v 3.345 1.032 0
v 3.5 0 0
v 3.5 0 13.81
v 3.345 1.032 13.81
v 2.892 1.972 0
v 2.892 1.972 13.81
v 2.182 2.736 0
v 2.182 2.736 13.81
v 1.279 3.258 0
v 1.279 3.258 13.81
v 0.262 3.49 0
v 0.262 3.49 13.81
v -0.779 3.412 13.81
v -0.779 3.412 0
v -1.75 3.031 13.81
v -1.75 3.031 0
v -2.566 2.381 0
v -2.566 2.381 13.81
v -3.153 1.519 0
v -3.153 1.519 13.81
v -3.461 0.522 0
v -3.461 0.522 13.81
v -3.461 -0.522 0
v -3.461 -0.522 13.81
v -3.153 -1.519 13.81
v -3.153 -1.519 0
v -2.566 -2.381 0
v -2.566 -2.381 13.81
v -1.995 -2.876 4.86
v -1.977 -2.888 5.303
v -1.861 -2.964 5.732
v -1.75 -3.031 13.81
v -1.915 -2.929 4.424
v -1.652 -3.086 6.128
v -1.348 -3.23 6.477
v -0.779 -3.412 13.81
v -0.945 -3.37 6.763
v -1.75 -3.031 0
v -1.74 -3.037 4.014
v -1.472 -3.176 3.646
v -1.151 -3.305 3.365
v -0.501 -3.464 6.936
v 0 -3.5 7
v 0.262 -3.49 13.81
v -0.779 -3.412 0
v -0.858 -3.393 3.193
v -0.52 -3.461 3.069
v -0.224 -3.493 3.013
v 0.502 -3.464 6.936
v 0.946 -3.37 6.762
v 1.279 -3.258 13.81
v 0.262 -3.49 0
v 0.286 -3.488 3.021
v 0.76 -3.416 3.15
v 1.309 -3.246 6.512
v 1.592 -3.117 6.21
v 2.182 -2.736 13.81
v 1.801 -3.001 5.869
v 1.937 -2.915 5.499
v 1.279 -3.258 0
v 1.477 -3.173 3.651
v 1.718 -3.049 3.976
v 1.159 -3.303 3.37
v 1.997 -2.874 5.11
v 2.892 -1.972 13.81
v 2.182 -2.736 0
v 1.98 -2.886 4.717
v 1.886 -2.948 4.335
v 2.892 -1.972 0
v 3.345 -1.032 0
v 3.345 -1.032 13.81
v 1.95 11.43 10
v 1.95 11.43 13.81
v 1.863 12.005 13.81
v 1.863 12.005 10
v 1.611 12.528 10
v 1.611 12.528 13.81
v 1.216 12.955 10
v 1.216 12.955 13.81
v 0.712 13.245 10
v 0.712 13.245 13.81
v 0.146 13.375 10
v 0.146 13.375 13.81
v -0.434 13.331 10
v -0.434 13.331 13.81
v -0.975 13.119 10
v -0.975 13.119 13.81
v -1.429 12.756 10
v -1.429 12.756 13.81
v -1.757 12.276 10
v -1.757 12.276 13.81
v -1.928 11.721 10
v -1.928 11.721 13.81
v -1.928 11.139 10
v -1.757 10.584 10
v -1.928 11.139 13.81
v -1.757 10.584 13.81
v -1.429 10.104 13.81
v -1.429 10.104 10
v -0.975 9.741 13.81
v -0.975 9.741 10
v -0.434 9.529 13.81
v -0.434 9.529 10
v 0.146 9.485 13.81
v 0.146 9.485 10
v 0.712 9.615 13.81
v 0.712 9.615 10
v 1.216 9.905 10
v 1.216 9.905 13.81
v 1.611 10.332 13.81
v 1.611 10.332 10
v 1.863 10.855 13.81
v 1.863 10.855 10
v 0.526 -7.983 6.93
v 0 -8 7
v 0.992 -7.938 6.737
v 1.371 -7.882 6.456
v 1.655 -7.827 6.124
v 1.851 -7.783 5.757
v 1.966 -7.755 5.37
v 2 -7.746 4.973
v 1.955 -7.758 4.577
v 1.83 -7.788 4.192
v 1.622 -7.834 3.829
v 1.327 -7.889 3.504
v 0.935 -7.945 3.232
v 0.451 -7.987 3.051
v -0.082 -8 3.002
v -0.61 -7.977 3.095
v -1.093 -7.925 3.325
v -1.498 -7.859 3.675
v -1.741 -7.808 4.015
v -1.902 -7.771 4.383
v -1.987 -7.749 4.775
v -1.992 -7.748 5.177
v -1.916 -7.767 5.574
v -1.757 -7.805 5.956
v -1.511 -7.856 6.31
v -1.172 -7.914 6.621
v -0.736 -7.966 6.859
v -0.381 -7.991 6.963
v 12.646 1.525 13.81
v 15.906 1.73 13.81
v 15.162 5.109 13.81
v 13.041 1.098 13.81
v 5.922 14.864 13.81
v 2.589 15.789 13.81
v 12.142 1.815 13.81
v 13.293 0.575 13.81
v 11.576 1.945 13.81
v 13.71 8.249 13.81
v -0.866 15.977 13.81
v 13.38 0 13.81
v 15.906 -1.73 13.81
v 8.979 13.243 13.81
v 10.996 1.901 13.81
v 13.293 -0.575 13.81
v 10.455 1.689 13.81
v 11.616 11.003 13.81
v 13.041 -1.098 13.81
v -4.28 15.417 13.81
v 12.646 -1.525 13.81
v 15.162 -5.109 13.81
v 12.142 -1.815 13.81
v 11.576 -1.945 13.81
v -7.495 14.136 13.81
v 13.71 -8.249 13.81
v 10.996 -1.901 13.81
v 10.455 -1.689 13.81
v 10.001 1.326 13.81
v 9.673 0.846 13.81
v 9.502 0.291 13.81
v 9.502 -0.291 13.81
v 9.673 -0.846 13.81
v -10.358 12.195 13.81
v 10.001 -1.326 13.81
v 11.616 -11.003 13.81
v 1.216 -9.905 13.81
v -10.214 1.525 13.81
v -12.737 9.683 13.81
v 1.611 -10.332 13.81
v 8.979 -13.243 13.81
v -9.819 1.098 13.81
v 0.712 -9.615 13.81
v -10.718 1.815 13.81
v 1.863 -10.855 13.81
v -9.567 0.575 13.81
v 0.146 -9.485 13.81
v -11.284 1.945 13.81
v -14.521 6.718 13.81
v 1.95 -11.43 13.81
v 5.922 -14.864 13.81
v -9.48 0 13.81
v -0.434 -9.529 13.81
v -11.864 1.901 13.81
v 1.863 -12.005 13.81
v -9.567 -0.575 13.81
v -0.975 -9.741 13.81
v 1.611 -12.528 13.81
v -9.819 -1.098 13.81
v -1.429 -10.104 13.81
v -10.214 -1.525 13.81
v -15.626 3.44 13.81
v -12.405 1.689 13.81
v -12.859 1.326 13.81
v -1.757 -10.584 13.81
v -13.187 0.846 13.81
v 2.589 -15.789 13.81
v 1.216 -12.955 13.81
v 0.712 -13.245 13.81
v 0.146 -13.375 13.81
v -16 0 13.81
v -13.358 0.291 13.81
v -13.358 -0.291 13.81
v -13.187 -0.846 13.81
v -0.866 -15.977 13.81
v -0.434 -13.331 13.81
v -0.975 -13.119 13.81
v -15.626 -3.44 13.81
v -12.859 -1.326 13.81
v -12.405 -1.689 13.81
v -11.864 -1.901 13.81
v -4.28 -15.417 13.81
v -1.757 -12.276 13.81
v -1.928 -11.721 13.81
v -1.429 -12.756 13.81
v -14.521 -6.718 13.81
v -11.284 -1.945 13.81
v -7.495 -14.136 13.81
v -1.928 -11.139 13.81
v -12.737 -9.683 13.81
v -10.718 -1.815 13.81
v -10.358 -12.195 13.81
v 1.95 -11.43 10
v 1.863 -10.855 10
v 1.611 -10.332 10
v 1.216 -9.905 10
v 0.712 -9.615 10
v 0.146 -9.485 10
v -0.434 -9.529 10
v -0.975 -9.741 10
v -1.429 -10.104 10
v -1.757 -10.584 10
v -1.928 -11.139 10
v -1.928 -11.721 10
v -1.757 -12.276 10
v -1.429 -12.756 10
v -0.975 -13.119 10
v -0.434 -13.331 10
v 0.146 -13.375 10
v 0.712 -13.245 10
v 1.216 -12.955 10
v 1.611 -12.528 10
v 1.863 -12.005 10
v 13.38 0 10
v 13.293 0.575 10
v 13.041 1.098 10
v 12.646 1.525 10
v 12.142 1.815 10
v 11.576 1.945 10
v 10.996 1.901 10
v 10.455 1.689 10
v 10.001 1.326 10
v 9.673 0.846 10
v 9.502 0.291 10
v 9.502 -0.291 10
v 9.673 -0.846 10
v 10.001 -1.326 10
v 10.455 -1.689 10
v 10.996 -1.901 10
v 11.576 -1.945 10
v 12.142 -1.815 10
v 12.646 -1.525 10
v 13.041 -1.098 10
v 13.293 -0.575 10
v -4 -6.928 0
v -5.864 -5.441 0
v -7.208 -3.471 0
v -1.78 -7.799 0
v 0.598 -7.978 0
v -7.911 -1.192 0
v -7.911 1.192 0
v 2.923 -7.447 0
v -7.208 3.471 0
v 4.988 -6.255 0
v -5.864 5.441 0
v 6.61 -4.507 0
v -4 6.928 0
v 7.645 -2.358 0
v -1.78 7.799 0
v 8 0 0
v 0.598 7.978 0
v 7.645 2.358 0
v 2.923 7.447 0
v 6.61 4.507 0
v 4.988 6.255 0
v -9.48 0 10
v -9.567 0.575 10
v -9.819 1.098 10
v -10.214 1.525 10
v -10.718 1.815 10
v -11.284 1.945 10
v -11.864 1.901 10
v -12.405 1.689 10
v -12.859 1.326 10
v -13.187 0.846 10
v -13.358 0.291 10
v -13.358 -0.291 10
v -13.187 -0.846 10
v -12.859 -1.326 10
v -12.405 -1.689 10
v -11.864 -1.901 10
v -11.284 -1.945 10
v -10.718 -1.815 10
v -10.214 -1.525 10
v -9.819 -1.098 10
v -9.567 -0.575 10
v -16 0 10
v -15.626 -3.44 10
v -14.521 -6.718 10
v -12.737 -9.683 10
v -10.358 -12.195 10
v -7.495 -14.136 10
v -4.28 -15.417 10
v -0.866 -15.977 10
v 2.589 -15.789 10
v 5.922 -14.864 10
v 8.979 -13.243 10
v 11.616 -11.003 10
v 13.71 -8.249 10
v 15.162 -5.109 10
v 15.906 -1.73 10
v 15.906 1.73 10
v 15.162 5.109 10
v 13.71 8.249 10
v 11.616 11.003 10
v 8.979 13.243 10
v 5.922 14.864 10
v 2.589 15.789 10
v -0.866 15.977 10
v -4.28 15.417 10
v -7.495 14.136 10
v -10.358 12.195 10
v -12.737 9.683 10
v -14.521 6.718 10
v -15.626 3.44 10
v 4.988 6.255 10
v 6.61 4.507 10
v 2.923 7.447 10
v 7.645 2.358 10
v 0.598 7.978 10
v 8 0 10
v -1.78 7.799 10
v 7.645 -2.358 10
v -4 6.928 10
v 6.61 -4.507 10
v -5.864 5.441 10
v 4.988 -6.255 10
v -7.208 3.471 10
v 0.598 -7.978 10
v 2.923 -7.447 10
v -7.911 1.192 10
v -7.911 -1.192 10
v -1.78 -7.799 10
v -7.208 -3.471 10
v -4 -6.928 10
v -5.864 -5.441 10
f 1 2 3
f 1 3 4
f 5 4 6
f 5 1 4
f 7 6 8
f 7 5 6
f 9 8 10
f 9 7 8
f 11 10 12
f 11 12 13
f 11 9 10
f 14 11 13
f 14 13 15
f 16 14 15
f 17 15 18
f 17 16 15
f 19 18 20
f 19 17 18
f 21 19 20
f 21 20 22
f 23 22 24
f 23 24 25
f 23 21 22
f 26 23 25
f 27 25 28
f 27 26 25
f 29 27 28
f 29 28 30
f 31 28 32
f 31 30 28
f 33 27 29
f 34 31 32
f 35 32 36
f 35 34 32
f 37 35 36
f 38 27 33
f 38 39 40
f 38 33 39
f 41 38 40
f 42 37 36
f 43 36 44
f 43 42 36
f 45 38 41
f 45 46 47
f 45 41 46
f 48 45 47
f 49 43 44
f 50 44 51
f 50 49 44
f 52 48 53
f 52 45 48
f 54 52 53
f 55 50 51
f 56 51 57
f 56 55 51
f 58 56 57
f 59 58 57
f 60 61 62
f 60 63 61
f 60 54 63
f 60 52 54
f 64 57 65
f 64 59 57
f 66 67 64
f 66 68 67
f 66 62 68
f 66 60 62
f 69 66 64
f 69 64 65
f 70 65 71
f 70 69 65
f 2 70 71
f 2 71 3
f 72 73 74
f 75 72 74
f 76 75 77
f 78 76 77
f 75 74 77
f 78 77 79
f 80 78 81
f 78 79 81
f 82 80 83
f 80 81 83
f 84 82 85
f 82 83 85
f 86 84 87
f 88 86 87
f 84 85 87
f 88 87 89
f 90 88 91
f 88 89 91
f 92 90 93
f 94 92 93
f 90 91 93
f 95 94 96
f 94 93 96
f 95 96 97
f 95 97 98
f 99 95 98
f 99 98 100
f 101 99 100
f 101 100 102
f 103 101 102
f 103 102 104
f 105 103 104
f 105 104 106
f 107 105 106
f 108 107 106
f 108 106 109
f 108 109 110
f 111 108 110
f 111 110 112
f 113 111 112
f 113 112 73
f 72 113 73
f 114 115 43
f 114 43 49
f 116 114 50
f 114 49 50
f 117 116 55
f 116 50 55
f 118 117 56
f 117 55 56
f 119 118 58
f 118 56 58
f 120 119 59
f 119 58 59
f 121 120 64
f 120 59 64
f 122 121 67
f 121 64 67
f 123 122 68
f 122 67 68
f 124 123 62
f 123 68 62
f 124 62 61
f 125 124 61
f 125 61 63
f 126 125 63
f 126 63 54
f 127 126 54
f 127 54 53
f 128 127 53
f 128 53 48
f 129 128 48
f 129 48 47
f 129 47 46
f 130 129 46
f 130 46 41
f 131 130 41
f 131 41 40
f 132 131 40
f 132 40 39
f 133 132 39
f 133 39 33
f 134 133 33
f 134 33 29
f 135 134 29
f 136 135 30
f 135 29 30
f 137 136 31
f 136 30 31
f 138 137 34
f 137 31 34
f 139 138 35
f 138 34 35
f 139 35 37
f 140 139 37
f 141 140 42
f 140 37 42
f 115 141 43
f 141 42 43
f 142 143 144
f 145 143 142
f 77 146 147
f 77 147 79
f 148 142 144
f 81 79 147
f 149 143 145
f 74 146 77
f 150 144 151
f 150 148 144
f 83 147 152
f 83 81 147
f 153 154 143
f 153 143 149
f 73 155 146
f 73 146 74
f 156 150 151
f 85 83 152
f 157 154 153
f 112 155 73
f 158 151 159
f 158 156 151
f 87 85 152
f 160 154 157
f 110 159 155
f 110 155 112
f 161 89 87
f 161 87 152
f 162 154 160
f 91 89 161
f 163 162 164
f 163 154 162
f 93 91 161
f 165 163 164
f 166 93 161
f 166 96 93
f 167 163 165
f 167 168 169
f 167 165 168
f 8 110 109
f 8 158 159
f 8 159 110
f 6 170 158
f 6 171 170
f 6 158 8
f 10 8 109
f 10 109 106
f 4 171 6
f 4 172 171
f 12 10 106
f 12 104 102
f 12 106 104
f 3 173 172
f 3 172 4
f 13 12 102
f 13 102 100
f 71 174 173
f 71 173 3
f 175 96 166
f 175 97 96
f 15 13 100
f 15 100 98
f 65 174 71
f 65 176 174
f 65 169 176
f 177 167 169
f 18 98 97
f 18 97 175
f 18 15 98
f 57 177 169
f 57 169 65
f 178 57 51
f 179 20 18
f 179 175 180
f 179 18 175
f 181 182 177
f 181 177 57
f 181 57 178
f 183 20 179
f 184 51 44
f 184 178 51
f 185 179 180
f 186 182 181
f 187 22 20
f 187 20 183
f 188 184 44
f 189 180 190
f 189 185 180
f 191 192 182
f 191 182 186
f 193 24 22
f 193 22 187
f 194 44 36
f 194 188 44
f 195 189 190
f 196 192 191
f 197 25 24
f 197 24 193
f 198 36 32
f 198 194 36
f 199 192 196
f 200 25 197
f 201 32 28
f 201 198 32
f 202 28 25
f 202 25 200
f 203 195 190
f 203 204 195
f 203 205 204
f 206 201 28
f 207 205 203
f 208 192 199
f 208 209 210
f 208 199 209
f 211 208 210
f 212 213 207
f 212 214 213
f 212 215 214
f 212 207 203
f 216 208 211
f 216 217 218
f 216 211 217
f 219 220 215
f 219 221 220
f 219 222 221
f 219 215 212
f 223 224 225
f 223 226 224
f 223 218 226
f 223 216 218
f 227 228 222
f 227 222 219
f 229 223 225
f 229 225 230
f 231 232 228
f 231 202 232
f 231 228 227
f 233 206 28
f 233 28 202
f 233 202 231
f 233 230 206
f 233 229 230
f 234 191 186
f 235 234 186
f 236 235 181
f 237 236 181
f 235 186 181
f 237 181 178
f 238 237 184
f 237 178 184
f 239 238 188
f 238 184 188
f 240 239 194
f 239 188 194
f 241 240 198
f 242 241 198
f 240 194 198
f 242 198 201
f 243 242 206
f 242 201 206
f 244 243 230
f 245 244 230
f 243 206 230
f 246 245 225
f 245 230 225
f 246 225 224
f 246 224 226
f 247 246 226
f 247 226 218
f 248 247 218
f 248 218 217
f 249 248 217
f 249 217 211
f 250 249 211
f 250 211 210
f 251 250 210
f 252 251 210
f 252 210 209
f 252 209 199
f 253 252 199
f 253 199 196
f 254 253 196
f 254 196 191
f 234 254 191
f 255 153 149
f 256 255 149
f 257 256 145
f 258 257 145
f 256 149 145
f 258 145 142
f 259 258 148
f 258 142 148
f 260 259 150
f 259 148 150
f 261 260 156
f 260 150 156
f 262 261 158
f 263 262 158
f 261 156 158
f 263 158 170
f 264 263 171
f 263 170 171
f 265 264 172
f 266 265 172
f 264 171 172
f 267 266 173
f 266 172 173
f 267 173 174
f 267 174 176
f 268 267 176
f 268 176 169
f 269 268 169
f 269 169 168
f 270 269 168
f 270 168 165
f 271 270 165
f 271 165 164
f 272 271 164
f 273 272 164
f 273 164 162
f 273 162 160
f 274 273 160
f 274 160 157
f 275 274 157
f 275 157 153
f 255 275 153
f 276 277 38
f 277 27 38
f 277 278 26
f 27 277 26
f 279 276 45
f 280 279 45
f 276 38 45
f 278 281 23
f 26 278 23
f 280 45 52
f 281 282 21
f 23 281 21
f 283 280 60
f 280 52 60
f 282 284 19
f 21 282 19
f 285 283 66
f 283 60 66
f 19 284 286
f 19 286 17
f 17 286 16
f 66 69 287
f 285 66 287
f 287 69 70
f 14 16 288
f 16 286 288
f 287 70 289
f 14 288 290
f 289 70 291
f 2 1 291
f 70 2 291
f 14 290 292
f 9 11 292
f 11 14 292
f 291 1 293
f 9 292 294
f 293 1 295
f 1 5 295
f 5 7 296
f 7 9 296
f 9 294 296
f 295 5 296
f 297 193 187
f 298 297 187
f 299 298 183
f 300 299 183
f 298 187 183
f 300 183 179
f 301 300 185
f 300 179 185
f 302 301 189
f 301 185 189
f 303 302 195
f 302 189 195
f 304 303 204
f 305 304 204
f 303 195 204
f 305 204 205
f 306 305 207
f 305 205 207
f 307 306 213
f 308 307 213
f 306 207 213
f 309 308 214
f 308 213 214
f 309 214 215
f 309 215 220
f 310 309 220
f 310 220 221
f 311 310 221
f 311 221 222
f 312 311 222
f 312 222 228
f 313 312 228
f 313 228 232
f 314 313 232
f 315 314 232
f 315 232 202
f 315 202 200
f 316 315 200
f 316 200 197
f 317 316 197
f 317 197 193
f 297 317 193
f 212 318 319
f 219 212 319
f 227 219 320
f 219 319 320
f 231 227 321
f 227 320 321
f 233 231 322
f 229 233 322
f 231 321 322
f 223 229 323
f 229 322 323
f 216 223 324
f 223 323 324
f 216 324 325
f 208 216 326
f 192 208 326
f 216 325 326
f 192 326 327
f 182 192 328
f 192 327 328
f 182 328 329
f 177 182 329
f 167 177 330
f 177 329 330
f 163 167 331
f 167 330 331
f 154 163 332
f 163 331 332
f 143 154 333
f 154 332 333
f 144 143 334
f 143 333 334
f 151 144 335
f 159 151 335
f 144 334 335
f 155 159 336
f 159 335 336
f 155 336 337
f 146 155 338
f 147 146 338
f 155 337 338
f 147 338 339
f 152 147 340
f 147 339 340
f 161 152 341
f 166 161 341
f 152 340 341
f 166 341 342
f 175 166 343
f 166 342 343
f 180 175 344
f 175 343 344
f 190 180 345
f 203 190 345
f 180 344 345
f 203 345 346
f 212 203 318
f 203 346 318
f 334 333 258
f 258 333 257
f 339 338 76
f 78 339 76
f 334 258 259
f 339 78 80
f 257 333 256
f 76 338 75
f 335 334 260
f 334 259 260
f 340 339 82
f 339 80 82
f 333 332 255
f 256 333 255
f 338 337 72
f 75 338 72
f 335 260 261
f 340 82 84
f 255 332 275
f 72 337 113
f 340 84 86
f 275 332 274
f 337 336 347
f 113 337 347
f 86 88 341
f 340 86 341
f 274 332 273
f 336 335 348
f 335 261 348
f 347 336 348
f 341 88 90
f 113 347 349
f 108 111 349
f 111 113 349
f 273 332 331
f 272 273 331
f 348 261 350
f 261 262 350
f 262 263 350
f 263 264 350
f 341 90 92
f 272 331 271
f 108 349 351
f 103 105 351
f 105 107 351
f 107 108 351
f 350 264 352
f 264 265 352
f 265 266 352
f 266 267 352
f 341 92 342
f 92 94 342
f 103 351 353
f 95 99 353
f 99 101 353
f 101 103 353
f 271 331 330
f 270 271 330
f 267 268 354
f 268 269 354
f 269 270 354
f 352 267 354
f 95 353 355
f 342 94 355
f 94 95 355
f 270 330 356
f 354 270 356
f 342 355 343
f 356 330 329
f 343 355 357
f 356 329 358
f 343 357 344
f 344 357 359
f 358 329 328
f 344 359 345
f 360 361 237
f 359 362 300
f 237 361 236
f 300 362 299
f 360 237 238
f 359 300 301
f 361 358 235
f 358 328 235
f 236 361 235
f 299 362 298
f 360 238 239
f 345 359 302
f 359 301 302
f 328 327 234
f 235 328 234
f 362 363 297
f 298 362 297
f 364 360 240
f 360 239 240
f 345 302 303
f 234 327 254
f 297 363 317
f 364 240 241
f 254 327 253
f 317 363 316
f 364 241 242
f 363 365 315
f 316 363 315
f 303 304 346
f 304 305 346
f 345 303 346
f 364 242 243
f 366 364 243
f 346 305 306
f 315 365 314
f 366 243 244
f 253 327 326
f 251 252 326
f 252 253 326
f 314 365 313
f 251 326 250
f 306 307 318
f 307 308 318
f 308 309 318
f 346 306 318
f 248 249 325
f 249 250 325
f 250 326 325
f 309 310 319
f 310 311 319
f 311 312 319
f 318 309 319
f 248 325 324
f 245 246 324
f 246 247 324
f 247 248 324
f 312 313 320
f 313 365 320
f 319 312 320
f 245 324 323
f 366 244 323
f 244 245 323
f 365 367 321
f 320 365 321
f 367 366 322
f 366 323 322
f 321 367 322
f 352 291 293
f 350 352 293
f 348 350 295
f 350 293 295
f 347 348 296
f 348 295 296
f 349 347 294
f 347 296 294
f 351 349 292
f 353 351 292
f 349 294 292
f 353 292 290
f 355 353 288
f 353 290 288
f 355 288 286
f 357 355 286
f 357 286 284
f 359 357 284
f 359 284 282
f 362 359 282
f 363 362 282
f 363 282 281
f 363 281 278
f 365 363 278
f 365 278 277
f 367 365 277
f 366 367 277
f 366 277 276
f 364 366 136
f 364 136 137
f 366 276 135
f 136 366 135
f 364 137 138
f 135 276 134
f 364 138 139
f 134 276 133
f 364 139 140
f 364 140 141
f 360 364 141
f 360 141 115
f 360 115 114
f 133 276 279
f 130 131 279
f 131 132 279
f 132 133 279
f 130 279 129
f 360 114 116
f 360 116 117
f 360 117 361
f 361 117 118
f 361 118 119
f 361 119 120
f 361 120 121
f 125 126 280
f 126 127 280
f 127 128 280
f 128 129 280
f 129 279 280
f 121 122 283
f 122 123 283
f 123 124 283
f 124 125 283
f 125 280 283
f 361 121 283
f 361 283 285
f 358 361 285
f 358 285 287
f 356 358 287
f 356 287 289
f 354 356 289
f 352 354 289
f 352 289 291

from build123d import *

# Parameters (mm, degrees)
SKETCH1_R           = 8
SKETCH1_R_2         = 3.5
BOSS_EXTRUDE1_DEPTH = 10
SKETCH2_R           = 16
SKETCH2_R_2         = 3.5
BOSS_EXTRUDE2_DEPTH = 3.81
SKETCH3_R           = 1.95
CUT_EXTRUDE1_DEPTH  = 27.508792881
SKETCH4_R           = 2
CUT_EXTRUDE2_DEPTH  = 27.508792881


with BuildPart() as part:
    # Sketch1 → Boss-Extrude1 (new body)
    with BuildSketch(Plane.XY):
        Circle(SKETCH1_R)
        Circle(SKETCH1_R_2, mode=Mode.SUBTRACT)
    extrude(amount=BOSS_EXTRUDE1_DEPTH)

    # Sketch2 → Boss-Extrude2 (add)
    with BuildSketch(Plane.XY.offset(10)):
        with Locations(Location((0, 0, 0), (0, 0, 180))):
            Circle(SKETCH2_R)
        Circle(SKETCH2_R_2, mode=Mode.SUBTRACT)
    extrude(amount=BOSS_EXTRUDE2_DEPTH)

    # Sketch3 → Cut-Extrude1 (cut, through all)
    with BuildSketch(Plane.XY.offset(13.81)):
        with Locations((0, 11.43)):
            Circle(SKETCH3_R)
        with Locations((11.43, 0)):
            Circle(SKETCH3_R)
        with Locations((0, -11.43)):
            Circle(SKETCH3_R)
        with Locations((-11.43, 0)):
            Circle(SKETCH3_R)
    extrude(amount=-CUT_EXTRUDE1_DEPTH, mode=Mode.SUBTRACT)

    # Sketch4 → Cut-Extrude2 (cut, through all)
    with BuildSketch(Plane(origin=(0, 0, 0), x_dir=(1, 0, 0), z_dir=(0, 1, 0))):
        with Locations(Location((0, -5, 0), (0, 0, 270))):
            Circle(SKETCH4_R)
    extrude(amount=-CUT_EXTRUDE2_DEPTH, mode=Mode.SUBTRACT)


solid = part.part
